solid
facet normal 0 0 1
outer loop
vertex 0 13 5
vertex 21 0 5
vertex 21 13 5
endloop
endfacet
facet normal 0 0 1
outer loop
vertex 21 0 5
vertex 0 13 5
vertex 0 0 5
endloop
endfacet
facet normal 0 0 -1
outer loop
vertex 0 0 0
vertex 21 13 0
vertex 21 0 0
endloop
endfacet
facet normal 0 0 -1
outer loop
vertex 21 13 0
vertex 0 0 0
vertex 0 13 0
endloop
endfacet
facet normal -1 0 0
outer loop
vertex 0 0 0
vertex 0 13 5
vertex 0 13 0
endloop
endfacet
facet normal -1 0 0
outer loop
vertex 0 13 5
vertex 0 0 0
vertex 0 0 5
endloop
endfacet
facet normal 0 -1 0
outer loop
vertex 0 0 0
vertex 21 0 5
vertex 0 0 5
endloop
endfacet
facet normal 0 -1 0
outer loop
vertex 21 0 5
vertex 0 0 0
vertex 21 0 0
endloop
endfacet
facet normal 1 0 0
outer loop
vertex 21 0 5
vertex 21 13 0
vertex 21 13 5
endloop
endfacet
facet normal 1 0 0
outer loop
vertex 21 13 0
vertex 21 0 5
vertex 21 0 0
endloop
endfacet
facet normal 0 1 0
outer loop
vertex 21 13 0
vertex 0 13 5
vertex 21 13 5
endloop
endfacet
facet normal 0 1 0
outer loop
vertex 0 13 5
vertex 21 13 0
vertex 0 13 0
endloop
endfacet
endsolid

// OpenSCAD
translate([1.5, 3.5, 2.5]) color([0.2821670936164109, 0.7398695784196249, 0.9015687423954613]) cube([3, 7, 5], center=true);
translate([4.5, 3.5, 2.5]) color([0.06478718309218656, 0.3075184499818515, 0.32730937178137276]) cube([3, 7, 5], center=true);
translate([7.5, 3.5, 2.5]) color([0.373196919474838, 0.48026967262350795, 0.5820603979481933]) cube([3, 7, 5], center=true);
translate([10.5, 3.5, 2.5]) color([0.1372879505883815, 0.015498761483451418, 0.5048497045627587]) cube([3, 7, 5], center=true);
translate([13.5, 3.5, 2.5]) color([0.36698725510709684, 0.6348155217266559, 0.811995686067811]) cube([3, 7, 5], center=true);
translate([16.5, 3.5, 2.5]) color([0.8768405645756486, 0.1552431358080847, 0.1767648869043179]) cube([3, 7, 5], center=true);
translate([19.5, 3.5, 2.5]) color([0.991228648099722, 0.13558077637136434, 0.20650423900368708]) cube([3, 7, 5], center=true);
translate([3.5, 8.5, 2.5]) color([0.9151210693627757, 0.49673738754911745, 0.7672539256192649]) cube([7, 3, 5], center=true);
translate([10.5, 8.5, 2.5]) color([0.969306850533619, 0.23531586477578126, 0.13212860983739783]) cube([7, 3, 5], center=true);
translate([17.5, 8.5, 2.5]) color([0.23368957459901674, 0.38460662479298113, 0.6084990843462054]) cube([7, 3, 5], center=true);
translate([3.5, 11.5, 2.5]) color([0.1325407149567407, 0.4984659545183915, 0.9178662904203972]) cube([7, 3, 5], center=true);
translate([8.0, 11.5, 2.5]) color([0.6160167741323543, 0.02601445858505036, 0.596125612844632]) cube([2, 3, 5], center=true);
translate([10.0, 11.5, 2.5]) color([0.48919913512172475, 0.30869925031539414, 0.9586301909392594]) cube([2, 3, 5], center=true);
translate([12.0, 11.5, 2.5]) color([0.5555224541780607, 0.16303723797834868, 0.8790785483620981]) cube([2, 3, 5], center=true);
translate([14.0, 11.5, 2.5]) color([0.8092366229990562, 0.7373715302416316, 0.5460288399006699]) cube([2, 3, 5], center=true);
translate([16.0, 11.5, 2.5]) color([0.7042240787132147, 0.07877233817546292, 0.13744427713979768]) cube([2, 3, 5], center=true);
translate([18.0, 11.5, 2.5]) color([0.40185422229333856, 0.1910666288561843, 0.31642065037316636]) cube([2, 3, 5], center=true);
translate([20.0, 11.5, 2.5]) color([0.2917281417853558, 0.9437754009602987, 0.20866341172373193]) cube([2, 3, 5], center=true);
